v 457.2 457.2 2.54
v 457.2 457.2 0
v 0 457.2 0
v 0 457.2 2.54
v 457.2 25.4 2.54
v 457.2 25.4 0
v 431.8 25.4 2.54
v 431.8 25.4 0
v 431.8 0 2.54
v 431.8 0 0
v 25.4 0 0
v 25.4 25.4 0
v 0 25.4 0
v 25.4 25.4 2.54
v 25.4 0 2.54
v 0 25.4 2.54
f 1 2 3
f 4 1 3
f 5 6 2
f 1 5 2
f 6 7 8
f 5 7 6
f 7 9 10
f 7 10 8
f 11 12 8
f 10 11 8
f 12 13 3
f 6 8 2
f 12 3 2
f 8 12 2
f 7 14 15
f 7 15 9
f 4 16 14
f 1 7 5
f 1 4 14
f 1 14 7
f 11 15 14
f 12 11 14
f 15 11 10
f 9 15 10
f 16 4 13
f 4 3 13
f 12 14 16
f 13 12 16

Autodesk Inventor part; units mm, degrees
ref_plane "YZ Plane" through (0, 0, 0) normal (1, 0, 0) x (0, 1, 0)
ref_plane "XZ Plane" through (0, 0, 0) normal (0, 1, 0) x (-1, 0, 0)
ref_plane "XY Plane" through (0, 0, 0) normal (0, 0, 1) x (1, 0, 0)
sketch "Sketch1" plane through (0, 0, 0) normal (0, 0, 1) x (1, 0, 0)
  line L0 (0, 0) -> (457.2, 0)
  line L1 (457.2, 0) -> (457.2, 457.2)
  line L2 (457.2, 457.2) -> (0, 457.2)
  line L3 (0, 457.2) -> (0, 0)
  dimension "d0" = 457.2
  dimension "d1" = 457.2
extrude "Extrusion1" add sketch "Sketch1" along normal blind 2.54
sketch "Sketch2" plane through (0, 0, 2.54) normal (0, 0, 1) x (1, 0, 0)
  line L0 (0, 0) -> (457.2, 0) projected
  line L1 (0, 0) -> (25.4, 0)
  line L2 (25.4, 0) -> (25.4, 25.4)
  line L3 (25.4, 25.4) -> (0, 25.4)
  line L4 (0, 25.4) -> (0, 0)
  line L5 (457.2, 0) -> (431.8, 0)
  line L6 (431.8, 0) -> (431.8, 25.4)
  line L7 (431.8, 25.4) -> (457.2, 25.4)
  line L8 (457.2, 25.4) -> (457.2, 0)
  dimension "d4" = 25.4
  dimension "d5" = 25.4
  dimension "d6" = 25.4
  dimension "d7" = 25.4
extrude "Extrusion2" cut sketch "Sketch2" against normal blind 25.4
properties part number "Circuit Board"
